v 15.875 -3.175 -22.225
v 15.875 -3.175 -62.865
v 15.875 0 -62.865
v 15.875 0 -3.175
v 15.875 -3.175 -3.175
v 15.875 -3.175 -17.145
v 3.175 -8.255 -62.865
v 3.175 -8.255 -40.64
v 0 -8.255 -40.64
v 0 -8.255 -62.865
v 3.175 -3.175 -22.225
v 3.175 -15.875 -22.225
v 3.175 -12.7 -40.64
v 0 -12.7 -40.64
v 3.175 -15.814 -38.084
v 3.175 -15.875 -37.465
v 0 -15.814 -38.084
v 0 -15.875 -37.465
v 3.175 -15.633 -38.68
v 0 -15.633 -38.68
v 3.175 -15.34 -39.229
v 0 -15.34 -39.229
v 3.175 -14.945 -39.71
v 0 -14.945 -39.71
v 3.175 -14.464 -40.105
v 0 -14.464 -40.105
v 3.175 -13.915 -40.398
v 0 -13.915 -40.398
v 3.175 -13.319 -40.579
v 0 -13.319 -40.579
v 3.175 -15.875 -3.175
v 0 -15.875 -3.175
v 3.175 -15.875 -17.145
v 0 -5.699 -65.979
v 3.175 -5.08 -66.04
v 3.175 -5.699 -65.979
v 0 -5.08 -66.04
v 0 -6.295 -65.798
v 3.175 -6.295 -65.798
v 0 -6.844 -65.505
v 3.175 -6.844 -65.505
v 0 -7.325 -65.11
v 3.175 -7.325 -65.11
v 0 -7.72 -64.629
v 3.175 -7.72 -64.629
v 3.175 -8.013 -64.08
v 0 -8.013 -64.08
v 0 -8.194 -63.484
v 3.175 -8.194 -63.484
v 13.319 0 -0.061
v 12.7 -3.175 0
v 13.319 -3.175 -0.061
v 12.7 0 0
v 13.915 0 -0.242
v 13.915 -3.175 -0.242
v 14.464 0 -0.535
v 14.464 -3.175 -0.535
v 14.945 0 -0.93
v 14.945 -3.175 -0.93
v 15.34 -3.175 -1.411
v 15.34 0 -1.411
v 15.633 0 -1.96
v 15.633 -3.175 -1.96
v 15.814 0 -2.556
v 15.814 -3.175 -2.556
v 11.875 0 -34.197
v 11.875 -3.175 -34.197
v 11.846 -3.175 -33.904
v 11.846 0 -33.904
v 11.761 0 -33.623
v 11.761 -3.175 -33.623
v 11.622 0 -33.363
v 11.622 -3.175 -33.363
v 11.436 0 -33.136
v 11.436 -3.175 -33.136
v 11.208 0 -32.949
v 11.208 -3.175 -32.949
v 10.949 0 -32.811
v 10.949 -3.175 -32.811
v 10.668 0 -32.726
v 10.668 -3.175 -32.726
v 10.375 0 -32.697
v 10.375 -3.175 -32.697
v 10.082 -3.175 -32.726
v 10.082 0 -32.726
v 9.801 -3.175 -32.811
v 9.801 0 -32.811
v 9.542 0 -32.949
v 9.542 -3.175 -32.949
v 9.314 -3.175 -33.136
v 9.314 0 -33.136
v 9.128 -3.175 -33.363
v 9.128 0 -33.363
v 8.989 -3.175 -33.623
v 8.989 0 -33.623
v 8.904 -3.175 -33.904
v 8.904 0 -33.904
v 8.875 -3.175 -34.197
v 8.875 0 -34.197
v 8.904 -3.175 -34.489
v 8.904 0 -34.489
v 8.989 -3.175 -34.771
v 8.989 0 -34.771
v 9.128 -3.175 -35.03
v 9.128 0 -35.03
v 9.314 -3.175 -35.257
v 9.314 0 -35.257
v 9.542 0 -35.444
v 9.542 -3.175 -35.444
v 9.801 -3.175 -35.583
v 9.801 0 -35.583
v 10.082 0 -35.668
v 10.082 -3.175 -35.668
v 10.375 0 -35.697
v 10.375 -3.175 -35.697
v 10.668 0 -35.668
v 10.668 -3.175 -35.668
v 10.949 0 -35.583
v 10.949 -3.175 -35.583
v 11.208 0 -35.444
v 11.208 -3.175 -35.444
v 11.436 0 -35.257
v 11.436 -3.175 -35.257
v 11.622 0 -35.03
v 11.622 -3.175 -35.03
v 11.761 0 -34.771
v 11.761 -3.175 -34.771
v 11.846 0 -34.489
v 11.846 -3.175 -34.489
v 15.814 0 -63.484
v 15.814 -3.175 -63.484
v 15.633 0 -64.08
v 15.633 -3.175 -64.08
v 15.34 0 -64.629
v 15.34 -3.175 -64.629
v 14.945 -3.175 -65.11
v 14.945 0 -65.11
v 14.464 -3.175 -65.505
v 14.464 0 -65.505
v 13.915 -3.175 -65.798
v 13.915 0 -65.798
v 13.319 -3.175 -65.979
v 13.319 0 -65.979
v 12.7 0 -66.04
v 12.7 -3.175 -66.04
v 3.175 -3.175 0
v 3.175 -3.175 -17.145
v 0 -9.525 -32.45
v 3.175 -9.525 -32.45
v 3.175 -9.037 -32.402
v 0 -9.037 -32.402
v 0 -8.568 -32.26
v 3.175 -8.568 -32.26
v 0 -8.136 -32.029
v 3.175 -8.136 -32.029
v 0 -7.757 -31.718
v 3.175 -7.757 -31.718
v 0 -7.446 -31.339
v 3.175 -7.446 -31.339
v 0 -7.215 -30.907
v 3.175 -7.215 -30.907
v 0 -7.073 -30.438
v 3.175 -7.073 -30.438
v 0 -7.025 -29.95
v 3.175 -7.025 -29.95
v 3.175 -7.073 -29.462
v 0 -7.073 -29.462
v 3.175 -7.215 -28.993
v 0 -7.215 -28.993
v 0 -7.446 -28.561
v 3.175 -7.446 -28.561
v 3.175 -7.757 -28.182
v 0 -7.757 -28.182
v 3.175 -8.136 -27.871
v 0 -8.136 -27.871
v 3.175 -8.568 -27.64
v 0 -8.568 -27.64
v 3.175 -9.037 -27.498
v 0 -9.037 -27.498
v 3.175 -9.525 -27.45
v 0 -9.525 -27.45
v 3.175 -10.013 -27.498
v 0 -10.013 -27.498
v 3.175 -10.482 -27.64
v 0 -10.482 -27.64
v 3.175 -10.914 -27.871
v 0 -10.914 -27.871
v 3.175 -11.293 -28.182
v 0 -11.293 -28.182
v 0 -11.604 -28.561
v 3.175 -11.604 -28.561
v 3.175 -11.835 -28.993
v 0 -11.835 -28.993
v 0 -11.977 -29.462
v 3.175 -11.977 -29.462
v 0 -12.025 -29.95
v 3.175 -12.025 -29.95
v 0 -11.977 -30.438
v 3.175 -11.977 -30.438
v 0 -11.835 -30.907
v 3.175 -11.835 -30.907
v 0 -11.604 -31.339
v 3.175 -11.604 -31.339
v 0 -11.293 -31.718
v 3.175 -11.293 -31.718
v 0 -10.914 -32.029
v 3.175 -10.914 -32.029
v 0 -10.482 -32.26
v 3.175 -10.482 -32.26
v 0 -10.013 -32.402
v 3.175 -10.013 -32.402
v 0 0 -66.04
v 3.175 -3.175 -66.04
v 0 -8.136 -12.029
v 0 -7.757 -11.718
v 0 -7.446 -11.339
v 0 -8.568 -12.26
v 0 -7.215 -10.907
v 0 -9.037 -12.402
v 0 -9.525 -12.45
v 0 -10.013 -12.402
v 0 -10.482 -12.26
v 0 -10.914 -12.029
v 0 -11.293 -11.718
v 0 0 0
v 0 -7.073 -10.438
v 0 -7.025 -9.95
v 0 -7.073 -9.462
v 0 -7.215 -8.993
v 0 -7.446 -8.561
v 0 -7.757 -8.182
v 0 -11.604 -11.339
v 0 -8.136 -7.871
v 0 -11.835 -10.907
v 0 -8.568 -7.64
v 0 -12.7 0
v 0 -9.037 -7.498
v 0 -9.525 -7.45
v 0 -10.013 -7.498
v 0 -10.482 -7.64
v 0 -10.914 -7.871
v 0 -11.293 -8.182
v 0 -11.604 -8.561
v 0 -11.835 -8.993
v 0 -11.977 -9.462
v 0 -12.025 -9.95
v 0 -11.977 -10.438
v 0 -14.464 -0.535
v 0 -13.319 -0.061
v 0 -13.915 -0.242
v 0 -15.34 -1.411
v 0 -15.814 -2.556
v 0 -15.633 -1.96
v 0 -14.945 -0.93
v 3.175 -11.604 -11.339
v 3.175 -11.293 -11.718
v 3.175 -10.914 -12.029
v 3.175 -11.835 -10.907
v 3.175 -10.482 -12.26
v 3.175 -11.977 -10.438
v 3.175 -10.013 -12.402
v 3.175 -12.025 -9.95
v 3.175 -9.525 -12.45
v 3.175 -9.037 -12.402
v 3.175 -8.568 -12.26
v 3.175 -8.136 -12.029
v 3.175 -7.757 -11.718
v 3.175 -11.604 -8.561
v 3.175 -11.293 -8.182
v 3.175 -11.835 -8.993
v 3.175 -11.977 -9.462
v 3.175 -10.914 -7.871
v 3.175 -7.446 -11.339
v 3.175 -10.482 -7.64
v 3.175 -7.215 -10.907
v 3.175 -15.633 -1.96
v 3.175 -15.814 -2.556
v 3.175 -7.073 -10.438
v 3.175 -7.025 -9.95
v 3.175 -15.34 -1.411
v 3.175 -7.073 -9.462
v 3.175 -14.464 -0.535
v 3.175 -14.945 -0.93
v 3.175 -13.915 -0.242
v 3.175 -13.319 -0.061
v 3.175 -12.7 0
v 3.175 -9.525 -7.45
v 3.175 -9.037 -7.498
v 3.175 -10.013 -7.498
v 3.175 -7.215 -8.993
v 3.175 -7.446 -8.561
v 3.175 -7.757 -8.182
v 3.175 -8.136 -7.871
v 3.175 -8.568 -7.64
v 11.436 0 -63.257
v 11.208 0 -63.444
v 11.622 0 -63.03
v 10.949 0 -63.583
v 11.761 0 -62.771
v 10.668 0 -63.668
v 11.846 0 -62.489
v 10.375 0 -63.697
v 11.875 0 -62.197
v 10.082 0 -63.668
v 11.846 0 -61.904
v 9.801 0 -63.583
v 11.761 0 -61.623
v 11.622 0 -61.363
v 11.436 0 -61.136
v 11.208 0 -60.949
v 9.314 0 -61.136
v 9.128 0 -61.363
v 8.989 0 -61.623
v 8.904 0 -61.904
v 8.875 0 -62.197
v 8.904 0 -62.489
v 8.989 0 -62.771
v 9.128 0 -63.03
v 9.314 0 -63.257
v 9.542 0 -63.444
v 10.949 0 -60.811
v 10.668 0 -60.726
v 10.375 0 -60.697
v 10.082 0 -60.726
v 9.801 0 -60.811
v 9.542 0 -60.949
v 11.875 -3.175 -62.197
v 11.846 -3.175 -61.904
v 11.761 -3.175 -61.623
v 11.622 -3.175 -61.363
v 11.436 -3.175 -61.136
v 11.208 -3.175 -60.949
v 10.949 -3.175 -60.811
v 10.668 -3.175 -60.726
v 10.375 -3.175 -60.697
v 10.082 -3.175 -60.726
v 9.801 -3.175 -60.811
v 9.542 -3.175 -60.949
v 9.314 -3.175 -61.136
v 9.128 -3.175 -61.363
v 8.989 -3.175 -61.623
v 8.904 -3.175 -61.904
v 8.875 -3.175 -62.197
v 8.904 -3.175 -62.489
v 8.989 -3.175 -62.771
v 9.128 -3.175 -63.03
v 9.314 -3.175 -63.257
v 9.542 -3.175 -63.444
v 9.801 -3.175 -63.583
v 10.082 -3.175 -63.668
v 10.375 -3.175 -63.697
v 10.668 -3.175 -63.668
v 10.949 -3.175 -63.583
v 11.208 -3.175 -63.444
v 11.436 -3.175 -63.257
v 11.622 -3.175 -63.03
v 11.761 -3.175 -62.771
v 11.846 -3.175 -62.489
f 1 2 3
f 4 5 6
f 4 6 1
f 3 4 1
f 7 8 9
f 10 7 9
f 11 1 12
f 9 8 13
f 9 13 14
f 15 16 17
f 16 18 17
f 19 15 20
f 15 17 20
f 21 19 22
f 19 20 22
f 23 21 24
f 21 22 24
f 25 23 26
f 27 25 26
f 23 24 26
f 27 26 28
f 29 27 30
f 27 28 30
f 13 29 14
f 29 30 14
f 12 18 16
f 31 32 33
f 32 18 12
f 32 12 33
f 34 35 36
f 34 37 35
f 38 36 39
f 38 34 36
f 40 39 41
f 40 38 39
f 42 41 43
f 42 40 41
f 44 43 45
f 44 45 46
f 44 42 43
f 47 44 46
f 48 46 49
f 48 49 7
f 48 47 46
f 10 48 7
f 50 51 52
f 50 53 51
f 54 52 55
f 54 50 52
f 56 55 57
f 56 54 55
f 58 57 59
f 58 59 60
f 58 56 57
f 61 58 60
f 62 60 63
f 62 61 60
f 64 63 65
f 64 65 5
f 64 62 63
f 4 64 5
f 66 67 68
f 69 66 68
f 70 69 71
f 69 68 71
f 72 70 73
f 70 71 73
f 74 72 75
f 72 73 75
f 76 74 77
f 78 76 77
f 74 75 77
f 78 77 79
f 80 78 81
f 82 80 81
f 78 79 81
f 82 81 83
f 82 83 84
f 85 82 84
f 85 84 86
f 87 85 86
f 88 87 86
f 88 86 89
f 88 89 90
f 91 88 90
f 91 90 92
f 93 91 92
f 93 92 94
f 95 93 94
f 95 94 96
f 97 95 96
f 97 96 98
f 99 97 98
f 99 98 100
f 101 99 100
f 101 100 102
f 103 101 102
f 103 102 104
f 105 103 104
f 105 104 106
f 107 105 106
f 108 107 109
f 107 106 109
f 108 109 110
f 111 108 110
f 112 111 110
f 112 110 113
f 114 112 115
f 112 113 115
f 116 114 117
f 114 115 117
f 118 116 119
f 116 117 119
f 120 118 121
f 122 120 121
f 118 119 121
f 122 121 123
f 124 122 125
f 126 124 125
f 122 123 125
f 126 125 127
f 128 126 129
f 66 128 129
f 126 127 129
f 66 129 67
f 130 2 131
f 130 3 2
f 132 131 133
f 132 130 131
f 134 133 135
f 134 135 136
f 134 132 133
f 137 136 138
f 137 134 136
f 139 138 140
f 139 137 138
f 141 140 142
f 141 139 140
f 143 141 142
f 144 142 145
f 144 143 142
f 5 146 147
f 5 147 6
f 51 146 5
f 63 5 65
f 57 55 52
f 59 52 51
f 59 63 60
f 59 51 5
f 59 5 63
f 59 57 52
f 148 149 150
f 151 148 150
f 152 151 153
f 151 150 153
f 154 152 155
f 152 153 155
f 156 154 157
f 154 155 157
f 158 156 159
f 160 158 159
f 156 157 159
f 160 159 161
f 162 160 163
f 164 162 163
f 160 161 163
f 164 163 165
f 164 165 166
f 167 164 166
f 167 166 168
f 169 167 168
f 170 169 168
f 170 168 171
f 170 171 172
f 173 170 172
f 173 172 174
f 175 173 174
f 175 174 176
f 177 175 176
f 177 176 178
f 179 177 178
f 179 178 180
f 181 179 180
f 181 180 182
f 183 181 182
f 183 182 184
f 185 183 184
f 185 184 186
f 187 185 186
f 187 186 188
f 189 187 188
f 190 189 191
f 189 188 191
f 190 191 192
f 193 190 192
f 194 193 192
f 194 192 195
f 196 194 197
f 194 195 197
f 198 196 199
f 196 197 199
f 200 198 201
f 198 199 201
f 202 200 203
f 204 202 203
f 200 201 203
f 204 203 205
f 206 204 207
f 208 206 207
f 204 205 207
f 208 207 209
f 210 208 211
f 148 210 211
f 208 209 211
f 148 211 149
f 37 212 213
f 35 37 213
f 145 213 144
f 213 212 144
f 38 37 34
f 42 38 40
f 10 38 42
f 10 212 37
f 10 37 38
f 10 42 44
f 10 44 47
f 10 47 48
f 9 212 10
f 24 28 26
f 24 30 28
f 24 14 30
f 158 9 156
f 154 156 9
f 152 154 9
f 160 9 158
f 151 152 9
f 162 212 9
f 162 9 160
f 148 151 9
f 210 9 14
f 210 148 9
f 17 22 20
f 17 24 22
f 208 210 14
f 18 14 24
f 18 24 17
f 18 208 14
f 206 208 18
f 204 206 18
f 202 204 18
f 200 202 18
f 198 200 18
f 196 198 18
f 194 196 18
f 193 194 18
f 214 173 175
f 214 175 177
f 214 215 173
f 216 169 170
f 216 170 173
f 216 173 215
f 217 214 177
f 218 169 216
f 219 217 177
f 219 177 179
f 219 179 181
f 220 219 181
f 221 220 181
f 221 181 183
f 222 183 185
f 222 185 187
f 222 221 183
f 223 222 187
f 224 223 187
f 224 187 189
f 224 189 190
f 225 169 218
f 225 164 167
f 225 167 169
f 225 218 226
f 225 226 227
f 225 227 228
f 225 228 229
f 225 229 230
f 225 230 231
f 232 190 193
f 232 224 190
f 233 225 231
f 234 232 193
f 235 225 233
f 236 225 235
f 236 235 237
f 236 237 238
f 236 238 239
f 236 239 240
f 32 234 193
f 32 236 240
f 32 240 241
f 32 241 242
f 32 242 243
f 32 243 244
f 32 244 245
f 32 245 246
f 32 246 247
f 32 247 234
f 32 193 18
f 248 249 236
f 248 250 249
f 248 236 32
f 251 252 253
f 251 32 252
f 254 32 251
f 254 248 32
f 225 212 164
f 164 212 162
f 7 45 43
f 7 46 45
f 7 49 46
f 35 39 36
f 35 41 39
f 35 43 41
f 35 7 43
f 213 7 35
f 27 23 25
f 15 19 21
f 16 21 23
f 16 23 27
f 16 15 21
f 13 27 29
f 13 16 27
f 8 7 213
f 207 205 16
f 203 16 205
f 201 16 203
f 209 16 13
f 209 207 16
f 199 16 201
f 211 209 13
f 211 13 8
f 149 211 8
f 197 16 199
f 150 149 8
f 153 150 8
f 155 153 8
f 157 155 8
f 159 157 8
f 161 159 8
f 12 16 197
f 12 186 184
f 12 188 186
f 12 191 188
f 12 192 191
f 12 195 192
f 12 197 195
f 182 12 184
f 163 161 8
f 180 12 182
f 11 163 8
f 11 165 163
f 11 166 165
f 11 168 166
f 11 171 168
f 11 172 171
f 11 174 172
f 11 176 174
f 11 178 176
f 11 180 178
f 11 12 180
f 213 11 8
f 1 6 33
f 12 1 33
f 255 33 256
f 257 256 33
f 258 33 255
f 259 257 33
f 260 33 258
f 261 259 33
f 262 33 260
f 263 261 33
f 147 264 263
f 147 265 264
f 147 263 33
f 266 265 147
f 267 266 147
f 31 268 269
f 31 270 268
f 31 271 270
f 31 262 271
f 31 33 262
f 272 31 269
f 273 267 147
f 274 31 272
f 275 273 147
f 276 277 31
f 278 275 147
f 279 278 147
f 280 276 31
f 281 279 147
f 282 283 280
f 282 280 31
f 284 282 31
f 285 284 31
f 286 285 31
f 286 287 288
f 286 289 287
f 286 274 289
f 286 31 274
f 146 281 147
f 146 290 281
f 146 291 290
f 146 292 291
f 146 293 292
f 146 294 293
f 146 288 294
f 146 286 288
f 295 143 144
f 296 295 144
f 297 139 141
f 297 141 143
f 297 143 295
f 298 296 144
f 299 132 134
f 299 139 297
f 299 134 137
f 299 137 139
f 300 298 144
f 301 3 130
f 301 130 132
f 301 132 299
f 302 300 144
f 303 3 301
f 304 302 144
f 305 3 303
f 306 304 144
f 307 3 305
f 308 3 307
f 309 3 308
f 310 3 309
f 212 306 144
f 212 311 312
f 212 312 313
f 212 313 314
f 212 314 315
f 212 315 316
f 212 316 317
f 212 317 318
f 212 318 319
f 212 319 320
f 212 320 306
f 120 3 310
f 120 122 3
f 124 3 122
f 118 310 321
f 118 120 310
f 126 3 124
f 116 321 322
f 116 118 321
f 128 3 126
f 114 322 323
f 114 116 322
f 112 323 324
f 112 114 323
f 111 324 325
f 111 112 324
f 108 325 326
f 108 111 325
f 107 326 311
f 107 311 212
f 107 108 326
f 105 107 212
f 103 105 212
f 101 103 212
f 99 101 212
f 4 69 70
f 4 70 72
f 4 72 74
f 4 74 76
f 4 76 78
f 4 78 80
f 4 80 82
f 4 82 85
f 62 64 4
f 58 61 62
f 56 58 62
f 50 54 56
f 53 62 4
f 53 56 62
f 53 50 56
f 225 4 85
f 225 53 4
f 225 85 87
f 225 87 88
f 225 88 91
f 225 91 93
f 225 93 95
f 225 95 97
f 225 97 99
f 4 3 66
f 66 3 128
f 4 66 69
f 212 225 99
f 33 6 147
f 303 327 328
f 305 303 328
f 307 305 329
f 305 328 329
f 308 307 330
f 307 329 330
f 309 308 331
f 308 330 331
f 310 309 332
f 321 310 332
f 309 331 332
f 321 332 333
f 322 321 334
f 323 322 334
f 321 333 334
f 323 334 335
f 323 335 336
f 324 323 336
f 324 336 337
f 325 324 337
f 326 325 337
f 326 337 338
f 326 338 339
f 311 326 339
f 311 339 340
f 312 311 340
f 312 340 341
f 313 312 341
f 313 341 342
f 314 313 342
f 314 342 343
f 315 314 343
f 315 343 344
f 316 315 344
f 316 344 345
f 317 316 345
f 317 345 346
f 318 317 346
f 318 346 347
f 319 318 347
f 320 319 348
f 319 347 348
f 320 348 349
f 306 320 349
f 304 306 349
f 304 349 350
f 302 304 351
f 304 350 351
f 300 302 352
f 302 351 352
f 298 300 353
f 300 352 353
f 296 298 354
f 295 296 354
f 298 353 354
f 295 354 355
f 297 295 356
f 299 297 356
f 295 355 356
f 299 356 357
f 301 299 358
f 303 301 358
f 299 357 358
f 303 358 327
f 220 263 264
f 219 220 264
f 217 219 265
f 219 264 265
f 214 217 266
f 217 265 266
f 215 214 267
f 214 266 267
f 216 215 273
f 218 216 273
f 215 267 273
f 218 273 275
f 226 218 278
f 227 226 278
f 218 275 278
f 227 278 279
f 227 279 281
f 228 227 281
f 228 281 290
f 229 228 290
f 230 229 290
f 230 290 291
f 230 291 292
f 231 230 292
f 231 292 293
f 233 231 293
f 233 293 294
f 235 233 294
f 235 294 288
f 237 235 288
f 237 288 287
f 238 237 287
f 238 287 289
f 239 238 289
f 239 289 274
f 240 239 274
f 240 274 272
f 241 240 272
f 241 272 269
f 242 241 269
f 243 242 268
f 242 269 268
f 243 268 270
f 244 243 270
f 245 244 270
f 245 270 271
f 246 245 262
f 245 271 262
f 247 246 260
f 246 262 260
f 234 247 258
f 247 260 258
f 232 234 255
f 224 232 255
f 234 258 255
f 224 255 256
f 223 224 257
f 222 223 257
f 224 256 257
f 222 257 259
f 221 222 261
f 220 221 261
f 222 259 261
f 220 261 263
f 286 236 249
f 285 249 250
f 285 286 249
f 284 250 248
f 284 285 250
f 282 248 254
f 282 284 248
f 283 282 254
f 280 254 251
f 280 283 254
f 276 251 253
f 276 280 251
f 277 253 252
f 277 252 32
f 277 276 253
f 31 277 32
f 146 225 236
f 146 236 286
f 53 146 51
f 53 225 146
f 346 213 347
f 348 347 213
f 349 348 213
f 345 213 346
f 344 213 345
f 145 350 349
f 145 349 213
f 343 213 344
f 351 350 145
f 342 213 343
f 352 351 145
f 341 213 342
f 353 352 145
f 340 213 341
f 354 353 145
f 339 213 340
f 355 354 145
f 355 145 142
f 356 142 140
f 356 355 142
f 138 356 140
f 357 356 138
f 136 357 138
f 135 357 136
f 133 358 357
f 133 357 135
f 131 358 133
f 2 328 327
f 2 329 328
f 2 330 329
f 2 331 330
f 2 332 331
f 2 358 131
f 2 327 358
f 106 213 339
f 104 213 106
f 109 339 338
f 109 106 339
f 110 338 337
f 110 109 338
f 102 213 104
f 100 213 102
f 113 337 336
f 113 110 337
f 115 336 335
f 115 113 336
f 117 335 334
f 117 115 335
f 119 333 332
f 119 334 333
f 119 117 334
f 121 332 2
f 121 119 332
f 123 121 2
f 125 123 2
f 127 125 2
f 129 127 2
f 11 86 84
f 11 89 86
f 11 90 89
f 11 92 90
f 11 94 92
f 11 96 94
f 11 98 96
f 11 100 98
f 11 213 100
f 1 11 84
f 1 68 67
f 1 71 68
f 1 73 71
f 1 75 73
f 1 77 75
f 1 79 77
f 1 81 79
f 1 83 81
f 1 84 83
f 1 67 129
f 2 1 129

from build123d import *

# Parameters (mm, degrees)
BOSS_EXTRUDE1_DEPTH = 66.04
SKETCH2_R           = 2.5
CUT_EXTRUDE1_DEPTH  = 4.175
BOSS_EXTRUDE2_DEPTH = 2.54
SKETCH4_W           = 3.175
SKETCH4_H           = 7.62
CUT_EXTRUDE2_DEPTH  = 25.4
SKETCH5_R           = 1.5
CUT_EXTRUDE3_DEPTH  = 25.4
FILLET1_R           = 3.175


with BuildPart() as part:
    # Sketch1 → Boss-Extrude1 (new body)
    with BuildSketch(Plane.XY):
        Polygon((3.175, -3.175), (15.875, -3.175), (15.875, 0), (0, 0), (0, -15.875), (3.175, -15.875), align=None)
    extrude(amount=-BOSS_EXTRUDE1_DEPTH)

    # Sketch2 → Cut-Extrude1 (cut, through all)
    with BuildSketch(Plane(origin=(3.175, 0, 0), x_dir=(0, 0, -1), z_dir=(1, 0, 0))):
        with Locations((29.95, -9.525)):
            Circle(SKETCH2_R)
        with Locations((9.95, -9.525)):
            Circle(SKETCH2_R)
    extrude(amount=-CUT_EXTRUDE1_DEPTH, mode=Mode.SUBTRACT)

    # Sketch3 → Boss-Extrude2 (add, symmetric)
    with BuildSketch(Plane.XY.offset(-19.685)):
        Polygon((3.175, -15.875), (3.175, -3.175), (15.875, -3.175), align=None)
    extrude(amount=BOSS_EXTRUDE2_DEPTH, both=True)

    # Sketch4 → Cut-Extrude2 (cut)
    with BuildSketch(Plane(origin=(0, 0, -66.04), x_dir=(-1, 0, 0), z_dir=(0, 0, -1))):
        with Locations((-1.5875, -12.065)):
            Rectangle(SKETCH4_W, SKETCH4_H)
    extrude(amount=-CUT_EXTRUDE2_DEPTH, mode=Mode.SUBTRACT)

    # Sketch5 → Cut-Extrude3 (cut)
    with BuildSketch(Plane.XZ.offset(3.175)):
        with Locations((10.375, -34.196688578)):
            Circle(SKETCH5_R)
        with Locations((10.375, -62.196688578)):
            Circle(SKETCH5_R)
    extrude(amount=-CUT_EXTRUDE3_DEPTH, mode=Mode.SUBTRACT)

    # Fillet1
    fillet1_edges = [part.edges().sort_by_distance(p)[0] for p in [
        (15.875, -1.5875, -66.04),
        (1.5875, -15.875, -40.64),
        (1.5875, -8.255, -66.04),
        (1.5875, -15.875, 0),
        (15.875, -1.5875, 0),
    ]]
    fillet(fillet1_edges, radius=FILLET1_R)


solid = part.part
